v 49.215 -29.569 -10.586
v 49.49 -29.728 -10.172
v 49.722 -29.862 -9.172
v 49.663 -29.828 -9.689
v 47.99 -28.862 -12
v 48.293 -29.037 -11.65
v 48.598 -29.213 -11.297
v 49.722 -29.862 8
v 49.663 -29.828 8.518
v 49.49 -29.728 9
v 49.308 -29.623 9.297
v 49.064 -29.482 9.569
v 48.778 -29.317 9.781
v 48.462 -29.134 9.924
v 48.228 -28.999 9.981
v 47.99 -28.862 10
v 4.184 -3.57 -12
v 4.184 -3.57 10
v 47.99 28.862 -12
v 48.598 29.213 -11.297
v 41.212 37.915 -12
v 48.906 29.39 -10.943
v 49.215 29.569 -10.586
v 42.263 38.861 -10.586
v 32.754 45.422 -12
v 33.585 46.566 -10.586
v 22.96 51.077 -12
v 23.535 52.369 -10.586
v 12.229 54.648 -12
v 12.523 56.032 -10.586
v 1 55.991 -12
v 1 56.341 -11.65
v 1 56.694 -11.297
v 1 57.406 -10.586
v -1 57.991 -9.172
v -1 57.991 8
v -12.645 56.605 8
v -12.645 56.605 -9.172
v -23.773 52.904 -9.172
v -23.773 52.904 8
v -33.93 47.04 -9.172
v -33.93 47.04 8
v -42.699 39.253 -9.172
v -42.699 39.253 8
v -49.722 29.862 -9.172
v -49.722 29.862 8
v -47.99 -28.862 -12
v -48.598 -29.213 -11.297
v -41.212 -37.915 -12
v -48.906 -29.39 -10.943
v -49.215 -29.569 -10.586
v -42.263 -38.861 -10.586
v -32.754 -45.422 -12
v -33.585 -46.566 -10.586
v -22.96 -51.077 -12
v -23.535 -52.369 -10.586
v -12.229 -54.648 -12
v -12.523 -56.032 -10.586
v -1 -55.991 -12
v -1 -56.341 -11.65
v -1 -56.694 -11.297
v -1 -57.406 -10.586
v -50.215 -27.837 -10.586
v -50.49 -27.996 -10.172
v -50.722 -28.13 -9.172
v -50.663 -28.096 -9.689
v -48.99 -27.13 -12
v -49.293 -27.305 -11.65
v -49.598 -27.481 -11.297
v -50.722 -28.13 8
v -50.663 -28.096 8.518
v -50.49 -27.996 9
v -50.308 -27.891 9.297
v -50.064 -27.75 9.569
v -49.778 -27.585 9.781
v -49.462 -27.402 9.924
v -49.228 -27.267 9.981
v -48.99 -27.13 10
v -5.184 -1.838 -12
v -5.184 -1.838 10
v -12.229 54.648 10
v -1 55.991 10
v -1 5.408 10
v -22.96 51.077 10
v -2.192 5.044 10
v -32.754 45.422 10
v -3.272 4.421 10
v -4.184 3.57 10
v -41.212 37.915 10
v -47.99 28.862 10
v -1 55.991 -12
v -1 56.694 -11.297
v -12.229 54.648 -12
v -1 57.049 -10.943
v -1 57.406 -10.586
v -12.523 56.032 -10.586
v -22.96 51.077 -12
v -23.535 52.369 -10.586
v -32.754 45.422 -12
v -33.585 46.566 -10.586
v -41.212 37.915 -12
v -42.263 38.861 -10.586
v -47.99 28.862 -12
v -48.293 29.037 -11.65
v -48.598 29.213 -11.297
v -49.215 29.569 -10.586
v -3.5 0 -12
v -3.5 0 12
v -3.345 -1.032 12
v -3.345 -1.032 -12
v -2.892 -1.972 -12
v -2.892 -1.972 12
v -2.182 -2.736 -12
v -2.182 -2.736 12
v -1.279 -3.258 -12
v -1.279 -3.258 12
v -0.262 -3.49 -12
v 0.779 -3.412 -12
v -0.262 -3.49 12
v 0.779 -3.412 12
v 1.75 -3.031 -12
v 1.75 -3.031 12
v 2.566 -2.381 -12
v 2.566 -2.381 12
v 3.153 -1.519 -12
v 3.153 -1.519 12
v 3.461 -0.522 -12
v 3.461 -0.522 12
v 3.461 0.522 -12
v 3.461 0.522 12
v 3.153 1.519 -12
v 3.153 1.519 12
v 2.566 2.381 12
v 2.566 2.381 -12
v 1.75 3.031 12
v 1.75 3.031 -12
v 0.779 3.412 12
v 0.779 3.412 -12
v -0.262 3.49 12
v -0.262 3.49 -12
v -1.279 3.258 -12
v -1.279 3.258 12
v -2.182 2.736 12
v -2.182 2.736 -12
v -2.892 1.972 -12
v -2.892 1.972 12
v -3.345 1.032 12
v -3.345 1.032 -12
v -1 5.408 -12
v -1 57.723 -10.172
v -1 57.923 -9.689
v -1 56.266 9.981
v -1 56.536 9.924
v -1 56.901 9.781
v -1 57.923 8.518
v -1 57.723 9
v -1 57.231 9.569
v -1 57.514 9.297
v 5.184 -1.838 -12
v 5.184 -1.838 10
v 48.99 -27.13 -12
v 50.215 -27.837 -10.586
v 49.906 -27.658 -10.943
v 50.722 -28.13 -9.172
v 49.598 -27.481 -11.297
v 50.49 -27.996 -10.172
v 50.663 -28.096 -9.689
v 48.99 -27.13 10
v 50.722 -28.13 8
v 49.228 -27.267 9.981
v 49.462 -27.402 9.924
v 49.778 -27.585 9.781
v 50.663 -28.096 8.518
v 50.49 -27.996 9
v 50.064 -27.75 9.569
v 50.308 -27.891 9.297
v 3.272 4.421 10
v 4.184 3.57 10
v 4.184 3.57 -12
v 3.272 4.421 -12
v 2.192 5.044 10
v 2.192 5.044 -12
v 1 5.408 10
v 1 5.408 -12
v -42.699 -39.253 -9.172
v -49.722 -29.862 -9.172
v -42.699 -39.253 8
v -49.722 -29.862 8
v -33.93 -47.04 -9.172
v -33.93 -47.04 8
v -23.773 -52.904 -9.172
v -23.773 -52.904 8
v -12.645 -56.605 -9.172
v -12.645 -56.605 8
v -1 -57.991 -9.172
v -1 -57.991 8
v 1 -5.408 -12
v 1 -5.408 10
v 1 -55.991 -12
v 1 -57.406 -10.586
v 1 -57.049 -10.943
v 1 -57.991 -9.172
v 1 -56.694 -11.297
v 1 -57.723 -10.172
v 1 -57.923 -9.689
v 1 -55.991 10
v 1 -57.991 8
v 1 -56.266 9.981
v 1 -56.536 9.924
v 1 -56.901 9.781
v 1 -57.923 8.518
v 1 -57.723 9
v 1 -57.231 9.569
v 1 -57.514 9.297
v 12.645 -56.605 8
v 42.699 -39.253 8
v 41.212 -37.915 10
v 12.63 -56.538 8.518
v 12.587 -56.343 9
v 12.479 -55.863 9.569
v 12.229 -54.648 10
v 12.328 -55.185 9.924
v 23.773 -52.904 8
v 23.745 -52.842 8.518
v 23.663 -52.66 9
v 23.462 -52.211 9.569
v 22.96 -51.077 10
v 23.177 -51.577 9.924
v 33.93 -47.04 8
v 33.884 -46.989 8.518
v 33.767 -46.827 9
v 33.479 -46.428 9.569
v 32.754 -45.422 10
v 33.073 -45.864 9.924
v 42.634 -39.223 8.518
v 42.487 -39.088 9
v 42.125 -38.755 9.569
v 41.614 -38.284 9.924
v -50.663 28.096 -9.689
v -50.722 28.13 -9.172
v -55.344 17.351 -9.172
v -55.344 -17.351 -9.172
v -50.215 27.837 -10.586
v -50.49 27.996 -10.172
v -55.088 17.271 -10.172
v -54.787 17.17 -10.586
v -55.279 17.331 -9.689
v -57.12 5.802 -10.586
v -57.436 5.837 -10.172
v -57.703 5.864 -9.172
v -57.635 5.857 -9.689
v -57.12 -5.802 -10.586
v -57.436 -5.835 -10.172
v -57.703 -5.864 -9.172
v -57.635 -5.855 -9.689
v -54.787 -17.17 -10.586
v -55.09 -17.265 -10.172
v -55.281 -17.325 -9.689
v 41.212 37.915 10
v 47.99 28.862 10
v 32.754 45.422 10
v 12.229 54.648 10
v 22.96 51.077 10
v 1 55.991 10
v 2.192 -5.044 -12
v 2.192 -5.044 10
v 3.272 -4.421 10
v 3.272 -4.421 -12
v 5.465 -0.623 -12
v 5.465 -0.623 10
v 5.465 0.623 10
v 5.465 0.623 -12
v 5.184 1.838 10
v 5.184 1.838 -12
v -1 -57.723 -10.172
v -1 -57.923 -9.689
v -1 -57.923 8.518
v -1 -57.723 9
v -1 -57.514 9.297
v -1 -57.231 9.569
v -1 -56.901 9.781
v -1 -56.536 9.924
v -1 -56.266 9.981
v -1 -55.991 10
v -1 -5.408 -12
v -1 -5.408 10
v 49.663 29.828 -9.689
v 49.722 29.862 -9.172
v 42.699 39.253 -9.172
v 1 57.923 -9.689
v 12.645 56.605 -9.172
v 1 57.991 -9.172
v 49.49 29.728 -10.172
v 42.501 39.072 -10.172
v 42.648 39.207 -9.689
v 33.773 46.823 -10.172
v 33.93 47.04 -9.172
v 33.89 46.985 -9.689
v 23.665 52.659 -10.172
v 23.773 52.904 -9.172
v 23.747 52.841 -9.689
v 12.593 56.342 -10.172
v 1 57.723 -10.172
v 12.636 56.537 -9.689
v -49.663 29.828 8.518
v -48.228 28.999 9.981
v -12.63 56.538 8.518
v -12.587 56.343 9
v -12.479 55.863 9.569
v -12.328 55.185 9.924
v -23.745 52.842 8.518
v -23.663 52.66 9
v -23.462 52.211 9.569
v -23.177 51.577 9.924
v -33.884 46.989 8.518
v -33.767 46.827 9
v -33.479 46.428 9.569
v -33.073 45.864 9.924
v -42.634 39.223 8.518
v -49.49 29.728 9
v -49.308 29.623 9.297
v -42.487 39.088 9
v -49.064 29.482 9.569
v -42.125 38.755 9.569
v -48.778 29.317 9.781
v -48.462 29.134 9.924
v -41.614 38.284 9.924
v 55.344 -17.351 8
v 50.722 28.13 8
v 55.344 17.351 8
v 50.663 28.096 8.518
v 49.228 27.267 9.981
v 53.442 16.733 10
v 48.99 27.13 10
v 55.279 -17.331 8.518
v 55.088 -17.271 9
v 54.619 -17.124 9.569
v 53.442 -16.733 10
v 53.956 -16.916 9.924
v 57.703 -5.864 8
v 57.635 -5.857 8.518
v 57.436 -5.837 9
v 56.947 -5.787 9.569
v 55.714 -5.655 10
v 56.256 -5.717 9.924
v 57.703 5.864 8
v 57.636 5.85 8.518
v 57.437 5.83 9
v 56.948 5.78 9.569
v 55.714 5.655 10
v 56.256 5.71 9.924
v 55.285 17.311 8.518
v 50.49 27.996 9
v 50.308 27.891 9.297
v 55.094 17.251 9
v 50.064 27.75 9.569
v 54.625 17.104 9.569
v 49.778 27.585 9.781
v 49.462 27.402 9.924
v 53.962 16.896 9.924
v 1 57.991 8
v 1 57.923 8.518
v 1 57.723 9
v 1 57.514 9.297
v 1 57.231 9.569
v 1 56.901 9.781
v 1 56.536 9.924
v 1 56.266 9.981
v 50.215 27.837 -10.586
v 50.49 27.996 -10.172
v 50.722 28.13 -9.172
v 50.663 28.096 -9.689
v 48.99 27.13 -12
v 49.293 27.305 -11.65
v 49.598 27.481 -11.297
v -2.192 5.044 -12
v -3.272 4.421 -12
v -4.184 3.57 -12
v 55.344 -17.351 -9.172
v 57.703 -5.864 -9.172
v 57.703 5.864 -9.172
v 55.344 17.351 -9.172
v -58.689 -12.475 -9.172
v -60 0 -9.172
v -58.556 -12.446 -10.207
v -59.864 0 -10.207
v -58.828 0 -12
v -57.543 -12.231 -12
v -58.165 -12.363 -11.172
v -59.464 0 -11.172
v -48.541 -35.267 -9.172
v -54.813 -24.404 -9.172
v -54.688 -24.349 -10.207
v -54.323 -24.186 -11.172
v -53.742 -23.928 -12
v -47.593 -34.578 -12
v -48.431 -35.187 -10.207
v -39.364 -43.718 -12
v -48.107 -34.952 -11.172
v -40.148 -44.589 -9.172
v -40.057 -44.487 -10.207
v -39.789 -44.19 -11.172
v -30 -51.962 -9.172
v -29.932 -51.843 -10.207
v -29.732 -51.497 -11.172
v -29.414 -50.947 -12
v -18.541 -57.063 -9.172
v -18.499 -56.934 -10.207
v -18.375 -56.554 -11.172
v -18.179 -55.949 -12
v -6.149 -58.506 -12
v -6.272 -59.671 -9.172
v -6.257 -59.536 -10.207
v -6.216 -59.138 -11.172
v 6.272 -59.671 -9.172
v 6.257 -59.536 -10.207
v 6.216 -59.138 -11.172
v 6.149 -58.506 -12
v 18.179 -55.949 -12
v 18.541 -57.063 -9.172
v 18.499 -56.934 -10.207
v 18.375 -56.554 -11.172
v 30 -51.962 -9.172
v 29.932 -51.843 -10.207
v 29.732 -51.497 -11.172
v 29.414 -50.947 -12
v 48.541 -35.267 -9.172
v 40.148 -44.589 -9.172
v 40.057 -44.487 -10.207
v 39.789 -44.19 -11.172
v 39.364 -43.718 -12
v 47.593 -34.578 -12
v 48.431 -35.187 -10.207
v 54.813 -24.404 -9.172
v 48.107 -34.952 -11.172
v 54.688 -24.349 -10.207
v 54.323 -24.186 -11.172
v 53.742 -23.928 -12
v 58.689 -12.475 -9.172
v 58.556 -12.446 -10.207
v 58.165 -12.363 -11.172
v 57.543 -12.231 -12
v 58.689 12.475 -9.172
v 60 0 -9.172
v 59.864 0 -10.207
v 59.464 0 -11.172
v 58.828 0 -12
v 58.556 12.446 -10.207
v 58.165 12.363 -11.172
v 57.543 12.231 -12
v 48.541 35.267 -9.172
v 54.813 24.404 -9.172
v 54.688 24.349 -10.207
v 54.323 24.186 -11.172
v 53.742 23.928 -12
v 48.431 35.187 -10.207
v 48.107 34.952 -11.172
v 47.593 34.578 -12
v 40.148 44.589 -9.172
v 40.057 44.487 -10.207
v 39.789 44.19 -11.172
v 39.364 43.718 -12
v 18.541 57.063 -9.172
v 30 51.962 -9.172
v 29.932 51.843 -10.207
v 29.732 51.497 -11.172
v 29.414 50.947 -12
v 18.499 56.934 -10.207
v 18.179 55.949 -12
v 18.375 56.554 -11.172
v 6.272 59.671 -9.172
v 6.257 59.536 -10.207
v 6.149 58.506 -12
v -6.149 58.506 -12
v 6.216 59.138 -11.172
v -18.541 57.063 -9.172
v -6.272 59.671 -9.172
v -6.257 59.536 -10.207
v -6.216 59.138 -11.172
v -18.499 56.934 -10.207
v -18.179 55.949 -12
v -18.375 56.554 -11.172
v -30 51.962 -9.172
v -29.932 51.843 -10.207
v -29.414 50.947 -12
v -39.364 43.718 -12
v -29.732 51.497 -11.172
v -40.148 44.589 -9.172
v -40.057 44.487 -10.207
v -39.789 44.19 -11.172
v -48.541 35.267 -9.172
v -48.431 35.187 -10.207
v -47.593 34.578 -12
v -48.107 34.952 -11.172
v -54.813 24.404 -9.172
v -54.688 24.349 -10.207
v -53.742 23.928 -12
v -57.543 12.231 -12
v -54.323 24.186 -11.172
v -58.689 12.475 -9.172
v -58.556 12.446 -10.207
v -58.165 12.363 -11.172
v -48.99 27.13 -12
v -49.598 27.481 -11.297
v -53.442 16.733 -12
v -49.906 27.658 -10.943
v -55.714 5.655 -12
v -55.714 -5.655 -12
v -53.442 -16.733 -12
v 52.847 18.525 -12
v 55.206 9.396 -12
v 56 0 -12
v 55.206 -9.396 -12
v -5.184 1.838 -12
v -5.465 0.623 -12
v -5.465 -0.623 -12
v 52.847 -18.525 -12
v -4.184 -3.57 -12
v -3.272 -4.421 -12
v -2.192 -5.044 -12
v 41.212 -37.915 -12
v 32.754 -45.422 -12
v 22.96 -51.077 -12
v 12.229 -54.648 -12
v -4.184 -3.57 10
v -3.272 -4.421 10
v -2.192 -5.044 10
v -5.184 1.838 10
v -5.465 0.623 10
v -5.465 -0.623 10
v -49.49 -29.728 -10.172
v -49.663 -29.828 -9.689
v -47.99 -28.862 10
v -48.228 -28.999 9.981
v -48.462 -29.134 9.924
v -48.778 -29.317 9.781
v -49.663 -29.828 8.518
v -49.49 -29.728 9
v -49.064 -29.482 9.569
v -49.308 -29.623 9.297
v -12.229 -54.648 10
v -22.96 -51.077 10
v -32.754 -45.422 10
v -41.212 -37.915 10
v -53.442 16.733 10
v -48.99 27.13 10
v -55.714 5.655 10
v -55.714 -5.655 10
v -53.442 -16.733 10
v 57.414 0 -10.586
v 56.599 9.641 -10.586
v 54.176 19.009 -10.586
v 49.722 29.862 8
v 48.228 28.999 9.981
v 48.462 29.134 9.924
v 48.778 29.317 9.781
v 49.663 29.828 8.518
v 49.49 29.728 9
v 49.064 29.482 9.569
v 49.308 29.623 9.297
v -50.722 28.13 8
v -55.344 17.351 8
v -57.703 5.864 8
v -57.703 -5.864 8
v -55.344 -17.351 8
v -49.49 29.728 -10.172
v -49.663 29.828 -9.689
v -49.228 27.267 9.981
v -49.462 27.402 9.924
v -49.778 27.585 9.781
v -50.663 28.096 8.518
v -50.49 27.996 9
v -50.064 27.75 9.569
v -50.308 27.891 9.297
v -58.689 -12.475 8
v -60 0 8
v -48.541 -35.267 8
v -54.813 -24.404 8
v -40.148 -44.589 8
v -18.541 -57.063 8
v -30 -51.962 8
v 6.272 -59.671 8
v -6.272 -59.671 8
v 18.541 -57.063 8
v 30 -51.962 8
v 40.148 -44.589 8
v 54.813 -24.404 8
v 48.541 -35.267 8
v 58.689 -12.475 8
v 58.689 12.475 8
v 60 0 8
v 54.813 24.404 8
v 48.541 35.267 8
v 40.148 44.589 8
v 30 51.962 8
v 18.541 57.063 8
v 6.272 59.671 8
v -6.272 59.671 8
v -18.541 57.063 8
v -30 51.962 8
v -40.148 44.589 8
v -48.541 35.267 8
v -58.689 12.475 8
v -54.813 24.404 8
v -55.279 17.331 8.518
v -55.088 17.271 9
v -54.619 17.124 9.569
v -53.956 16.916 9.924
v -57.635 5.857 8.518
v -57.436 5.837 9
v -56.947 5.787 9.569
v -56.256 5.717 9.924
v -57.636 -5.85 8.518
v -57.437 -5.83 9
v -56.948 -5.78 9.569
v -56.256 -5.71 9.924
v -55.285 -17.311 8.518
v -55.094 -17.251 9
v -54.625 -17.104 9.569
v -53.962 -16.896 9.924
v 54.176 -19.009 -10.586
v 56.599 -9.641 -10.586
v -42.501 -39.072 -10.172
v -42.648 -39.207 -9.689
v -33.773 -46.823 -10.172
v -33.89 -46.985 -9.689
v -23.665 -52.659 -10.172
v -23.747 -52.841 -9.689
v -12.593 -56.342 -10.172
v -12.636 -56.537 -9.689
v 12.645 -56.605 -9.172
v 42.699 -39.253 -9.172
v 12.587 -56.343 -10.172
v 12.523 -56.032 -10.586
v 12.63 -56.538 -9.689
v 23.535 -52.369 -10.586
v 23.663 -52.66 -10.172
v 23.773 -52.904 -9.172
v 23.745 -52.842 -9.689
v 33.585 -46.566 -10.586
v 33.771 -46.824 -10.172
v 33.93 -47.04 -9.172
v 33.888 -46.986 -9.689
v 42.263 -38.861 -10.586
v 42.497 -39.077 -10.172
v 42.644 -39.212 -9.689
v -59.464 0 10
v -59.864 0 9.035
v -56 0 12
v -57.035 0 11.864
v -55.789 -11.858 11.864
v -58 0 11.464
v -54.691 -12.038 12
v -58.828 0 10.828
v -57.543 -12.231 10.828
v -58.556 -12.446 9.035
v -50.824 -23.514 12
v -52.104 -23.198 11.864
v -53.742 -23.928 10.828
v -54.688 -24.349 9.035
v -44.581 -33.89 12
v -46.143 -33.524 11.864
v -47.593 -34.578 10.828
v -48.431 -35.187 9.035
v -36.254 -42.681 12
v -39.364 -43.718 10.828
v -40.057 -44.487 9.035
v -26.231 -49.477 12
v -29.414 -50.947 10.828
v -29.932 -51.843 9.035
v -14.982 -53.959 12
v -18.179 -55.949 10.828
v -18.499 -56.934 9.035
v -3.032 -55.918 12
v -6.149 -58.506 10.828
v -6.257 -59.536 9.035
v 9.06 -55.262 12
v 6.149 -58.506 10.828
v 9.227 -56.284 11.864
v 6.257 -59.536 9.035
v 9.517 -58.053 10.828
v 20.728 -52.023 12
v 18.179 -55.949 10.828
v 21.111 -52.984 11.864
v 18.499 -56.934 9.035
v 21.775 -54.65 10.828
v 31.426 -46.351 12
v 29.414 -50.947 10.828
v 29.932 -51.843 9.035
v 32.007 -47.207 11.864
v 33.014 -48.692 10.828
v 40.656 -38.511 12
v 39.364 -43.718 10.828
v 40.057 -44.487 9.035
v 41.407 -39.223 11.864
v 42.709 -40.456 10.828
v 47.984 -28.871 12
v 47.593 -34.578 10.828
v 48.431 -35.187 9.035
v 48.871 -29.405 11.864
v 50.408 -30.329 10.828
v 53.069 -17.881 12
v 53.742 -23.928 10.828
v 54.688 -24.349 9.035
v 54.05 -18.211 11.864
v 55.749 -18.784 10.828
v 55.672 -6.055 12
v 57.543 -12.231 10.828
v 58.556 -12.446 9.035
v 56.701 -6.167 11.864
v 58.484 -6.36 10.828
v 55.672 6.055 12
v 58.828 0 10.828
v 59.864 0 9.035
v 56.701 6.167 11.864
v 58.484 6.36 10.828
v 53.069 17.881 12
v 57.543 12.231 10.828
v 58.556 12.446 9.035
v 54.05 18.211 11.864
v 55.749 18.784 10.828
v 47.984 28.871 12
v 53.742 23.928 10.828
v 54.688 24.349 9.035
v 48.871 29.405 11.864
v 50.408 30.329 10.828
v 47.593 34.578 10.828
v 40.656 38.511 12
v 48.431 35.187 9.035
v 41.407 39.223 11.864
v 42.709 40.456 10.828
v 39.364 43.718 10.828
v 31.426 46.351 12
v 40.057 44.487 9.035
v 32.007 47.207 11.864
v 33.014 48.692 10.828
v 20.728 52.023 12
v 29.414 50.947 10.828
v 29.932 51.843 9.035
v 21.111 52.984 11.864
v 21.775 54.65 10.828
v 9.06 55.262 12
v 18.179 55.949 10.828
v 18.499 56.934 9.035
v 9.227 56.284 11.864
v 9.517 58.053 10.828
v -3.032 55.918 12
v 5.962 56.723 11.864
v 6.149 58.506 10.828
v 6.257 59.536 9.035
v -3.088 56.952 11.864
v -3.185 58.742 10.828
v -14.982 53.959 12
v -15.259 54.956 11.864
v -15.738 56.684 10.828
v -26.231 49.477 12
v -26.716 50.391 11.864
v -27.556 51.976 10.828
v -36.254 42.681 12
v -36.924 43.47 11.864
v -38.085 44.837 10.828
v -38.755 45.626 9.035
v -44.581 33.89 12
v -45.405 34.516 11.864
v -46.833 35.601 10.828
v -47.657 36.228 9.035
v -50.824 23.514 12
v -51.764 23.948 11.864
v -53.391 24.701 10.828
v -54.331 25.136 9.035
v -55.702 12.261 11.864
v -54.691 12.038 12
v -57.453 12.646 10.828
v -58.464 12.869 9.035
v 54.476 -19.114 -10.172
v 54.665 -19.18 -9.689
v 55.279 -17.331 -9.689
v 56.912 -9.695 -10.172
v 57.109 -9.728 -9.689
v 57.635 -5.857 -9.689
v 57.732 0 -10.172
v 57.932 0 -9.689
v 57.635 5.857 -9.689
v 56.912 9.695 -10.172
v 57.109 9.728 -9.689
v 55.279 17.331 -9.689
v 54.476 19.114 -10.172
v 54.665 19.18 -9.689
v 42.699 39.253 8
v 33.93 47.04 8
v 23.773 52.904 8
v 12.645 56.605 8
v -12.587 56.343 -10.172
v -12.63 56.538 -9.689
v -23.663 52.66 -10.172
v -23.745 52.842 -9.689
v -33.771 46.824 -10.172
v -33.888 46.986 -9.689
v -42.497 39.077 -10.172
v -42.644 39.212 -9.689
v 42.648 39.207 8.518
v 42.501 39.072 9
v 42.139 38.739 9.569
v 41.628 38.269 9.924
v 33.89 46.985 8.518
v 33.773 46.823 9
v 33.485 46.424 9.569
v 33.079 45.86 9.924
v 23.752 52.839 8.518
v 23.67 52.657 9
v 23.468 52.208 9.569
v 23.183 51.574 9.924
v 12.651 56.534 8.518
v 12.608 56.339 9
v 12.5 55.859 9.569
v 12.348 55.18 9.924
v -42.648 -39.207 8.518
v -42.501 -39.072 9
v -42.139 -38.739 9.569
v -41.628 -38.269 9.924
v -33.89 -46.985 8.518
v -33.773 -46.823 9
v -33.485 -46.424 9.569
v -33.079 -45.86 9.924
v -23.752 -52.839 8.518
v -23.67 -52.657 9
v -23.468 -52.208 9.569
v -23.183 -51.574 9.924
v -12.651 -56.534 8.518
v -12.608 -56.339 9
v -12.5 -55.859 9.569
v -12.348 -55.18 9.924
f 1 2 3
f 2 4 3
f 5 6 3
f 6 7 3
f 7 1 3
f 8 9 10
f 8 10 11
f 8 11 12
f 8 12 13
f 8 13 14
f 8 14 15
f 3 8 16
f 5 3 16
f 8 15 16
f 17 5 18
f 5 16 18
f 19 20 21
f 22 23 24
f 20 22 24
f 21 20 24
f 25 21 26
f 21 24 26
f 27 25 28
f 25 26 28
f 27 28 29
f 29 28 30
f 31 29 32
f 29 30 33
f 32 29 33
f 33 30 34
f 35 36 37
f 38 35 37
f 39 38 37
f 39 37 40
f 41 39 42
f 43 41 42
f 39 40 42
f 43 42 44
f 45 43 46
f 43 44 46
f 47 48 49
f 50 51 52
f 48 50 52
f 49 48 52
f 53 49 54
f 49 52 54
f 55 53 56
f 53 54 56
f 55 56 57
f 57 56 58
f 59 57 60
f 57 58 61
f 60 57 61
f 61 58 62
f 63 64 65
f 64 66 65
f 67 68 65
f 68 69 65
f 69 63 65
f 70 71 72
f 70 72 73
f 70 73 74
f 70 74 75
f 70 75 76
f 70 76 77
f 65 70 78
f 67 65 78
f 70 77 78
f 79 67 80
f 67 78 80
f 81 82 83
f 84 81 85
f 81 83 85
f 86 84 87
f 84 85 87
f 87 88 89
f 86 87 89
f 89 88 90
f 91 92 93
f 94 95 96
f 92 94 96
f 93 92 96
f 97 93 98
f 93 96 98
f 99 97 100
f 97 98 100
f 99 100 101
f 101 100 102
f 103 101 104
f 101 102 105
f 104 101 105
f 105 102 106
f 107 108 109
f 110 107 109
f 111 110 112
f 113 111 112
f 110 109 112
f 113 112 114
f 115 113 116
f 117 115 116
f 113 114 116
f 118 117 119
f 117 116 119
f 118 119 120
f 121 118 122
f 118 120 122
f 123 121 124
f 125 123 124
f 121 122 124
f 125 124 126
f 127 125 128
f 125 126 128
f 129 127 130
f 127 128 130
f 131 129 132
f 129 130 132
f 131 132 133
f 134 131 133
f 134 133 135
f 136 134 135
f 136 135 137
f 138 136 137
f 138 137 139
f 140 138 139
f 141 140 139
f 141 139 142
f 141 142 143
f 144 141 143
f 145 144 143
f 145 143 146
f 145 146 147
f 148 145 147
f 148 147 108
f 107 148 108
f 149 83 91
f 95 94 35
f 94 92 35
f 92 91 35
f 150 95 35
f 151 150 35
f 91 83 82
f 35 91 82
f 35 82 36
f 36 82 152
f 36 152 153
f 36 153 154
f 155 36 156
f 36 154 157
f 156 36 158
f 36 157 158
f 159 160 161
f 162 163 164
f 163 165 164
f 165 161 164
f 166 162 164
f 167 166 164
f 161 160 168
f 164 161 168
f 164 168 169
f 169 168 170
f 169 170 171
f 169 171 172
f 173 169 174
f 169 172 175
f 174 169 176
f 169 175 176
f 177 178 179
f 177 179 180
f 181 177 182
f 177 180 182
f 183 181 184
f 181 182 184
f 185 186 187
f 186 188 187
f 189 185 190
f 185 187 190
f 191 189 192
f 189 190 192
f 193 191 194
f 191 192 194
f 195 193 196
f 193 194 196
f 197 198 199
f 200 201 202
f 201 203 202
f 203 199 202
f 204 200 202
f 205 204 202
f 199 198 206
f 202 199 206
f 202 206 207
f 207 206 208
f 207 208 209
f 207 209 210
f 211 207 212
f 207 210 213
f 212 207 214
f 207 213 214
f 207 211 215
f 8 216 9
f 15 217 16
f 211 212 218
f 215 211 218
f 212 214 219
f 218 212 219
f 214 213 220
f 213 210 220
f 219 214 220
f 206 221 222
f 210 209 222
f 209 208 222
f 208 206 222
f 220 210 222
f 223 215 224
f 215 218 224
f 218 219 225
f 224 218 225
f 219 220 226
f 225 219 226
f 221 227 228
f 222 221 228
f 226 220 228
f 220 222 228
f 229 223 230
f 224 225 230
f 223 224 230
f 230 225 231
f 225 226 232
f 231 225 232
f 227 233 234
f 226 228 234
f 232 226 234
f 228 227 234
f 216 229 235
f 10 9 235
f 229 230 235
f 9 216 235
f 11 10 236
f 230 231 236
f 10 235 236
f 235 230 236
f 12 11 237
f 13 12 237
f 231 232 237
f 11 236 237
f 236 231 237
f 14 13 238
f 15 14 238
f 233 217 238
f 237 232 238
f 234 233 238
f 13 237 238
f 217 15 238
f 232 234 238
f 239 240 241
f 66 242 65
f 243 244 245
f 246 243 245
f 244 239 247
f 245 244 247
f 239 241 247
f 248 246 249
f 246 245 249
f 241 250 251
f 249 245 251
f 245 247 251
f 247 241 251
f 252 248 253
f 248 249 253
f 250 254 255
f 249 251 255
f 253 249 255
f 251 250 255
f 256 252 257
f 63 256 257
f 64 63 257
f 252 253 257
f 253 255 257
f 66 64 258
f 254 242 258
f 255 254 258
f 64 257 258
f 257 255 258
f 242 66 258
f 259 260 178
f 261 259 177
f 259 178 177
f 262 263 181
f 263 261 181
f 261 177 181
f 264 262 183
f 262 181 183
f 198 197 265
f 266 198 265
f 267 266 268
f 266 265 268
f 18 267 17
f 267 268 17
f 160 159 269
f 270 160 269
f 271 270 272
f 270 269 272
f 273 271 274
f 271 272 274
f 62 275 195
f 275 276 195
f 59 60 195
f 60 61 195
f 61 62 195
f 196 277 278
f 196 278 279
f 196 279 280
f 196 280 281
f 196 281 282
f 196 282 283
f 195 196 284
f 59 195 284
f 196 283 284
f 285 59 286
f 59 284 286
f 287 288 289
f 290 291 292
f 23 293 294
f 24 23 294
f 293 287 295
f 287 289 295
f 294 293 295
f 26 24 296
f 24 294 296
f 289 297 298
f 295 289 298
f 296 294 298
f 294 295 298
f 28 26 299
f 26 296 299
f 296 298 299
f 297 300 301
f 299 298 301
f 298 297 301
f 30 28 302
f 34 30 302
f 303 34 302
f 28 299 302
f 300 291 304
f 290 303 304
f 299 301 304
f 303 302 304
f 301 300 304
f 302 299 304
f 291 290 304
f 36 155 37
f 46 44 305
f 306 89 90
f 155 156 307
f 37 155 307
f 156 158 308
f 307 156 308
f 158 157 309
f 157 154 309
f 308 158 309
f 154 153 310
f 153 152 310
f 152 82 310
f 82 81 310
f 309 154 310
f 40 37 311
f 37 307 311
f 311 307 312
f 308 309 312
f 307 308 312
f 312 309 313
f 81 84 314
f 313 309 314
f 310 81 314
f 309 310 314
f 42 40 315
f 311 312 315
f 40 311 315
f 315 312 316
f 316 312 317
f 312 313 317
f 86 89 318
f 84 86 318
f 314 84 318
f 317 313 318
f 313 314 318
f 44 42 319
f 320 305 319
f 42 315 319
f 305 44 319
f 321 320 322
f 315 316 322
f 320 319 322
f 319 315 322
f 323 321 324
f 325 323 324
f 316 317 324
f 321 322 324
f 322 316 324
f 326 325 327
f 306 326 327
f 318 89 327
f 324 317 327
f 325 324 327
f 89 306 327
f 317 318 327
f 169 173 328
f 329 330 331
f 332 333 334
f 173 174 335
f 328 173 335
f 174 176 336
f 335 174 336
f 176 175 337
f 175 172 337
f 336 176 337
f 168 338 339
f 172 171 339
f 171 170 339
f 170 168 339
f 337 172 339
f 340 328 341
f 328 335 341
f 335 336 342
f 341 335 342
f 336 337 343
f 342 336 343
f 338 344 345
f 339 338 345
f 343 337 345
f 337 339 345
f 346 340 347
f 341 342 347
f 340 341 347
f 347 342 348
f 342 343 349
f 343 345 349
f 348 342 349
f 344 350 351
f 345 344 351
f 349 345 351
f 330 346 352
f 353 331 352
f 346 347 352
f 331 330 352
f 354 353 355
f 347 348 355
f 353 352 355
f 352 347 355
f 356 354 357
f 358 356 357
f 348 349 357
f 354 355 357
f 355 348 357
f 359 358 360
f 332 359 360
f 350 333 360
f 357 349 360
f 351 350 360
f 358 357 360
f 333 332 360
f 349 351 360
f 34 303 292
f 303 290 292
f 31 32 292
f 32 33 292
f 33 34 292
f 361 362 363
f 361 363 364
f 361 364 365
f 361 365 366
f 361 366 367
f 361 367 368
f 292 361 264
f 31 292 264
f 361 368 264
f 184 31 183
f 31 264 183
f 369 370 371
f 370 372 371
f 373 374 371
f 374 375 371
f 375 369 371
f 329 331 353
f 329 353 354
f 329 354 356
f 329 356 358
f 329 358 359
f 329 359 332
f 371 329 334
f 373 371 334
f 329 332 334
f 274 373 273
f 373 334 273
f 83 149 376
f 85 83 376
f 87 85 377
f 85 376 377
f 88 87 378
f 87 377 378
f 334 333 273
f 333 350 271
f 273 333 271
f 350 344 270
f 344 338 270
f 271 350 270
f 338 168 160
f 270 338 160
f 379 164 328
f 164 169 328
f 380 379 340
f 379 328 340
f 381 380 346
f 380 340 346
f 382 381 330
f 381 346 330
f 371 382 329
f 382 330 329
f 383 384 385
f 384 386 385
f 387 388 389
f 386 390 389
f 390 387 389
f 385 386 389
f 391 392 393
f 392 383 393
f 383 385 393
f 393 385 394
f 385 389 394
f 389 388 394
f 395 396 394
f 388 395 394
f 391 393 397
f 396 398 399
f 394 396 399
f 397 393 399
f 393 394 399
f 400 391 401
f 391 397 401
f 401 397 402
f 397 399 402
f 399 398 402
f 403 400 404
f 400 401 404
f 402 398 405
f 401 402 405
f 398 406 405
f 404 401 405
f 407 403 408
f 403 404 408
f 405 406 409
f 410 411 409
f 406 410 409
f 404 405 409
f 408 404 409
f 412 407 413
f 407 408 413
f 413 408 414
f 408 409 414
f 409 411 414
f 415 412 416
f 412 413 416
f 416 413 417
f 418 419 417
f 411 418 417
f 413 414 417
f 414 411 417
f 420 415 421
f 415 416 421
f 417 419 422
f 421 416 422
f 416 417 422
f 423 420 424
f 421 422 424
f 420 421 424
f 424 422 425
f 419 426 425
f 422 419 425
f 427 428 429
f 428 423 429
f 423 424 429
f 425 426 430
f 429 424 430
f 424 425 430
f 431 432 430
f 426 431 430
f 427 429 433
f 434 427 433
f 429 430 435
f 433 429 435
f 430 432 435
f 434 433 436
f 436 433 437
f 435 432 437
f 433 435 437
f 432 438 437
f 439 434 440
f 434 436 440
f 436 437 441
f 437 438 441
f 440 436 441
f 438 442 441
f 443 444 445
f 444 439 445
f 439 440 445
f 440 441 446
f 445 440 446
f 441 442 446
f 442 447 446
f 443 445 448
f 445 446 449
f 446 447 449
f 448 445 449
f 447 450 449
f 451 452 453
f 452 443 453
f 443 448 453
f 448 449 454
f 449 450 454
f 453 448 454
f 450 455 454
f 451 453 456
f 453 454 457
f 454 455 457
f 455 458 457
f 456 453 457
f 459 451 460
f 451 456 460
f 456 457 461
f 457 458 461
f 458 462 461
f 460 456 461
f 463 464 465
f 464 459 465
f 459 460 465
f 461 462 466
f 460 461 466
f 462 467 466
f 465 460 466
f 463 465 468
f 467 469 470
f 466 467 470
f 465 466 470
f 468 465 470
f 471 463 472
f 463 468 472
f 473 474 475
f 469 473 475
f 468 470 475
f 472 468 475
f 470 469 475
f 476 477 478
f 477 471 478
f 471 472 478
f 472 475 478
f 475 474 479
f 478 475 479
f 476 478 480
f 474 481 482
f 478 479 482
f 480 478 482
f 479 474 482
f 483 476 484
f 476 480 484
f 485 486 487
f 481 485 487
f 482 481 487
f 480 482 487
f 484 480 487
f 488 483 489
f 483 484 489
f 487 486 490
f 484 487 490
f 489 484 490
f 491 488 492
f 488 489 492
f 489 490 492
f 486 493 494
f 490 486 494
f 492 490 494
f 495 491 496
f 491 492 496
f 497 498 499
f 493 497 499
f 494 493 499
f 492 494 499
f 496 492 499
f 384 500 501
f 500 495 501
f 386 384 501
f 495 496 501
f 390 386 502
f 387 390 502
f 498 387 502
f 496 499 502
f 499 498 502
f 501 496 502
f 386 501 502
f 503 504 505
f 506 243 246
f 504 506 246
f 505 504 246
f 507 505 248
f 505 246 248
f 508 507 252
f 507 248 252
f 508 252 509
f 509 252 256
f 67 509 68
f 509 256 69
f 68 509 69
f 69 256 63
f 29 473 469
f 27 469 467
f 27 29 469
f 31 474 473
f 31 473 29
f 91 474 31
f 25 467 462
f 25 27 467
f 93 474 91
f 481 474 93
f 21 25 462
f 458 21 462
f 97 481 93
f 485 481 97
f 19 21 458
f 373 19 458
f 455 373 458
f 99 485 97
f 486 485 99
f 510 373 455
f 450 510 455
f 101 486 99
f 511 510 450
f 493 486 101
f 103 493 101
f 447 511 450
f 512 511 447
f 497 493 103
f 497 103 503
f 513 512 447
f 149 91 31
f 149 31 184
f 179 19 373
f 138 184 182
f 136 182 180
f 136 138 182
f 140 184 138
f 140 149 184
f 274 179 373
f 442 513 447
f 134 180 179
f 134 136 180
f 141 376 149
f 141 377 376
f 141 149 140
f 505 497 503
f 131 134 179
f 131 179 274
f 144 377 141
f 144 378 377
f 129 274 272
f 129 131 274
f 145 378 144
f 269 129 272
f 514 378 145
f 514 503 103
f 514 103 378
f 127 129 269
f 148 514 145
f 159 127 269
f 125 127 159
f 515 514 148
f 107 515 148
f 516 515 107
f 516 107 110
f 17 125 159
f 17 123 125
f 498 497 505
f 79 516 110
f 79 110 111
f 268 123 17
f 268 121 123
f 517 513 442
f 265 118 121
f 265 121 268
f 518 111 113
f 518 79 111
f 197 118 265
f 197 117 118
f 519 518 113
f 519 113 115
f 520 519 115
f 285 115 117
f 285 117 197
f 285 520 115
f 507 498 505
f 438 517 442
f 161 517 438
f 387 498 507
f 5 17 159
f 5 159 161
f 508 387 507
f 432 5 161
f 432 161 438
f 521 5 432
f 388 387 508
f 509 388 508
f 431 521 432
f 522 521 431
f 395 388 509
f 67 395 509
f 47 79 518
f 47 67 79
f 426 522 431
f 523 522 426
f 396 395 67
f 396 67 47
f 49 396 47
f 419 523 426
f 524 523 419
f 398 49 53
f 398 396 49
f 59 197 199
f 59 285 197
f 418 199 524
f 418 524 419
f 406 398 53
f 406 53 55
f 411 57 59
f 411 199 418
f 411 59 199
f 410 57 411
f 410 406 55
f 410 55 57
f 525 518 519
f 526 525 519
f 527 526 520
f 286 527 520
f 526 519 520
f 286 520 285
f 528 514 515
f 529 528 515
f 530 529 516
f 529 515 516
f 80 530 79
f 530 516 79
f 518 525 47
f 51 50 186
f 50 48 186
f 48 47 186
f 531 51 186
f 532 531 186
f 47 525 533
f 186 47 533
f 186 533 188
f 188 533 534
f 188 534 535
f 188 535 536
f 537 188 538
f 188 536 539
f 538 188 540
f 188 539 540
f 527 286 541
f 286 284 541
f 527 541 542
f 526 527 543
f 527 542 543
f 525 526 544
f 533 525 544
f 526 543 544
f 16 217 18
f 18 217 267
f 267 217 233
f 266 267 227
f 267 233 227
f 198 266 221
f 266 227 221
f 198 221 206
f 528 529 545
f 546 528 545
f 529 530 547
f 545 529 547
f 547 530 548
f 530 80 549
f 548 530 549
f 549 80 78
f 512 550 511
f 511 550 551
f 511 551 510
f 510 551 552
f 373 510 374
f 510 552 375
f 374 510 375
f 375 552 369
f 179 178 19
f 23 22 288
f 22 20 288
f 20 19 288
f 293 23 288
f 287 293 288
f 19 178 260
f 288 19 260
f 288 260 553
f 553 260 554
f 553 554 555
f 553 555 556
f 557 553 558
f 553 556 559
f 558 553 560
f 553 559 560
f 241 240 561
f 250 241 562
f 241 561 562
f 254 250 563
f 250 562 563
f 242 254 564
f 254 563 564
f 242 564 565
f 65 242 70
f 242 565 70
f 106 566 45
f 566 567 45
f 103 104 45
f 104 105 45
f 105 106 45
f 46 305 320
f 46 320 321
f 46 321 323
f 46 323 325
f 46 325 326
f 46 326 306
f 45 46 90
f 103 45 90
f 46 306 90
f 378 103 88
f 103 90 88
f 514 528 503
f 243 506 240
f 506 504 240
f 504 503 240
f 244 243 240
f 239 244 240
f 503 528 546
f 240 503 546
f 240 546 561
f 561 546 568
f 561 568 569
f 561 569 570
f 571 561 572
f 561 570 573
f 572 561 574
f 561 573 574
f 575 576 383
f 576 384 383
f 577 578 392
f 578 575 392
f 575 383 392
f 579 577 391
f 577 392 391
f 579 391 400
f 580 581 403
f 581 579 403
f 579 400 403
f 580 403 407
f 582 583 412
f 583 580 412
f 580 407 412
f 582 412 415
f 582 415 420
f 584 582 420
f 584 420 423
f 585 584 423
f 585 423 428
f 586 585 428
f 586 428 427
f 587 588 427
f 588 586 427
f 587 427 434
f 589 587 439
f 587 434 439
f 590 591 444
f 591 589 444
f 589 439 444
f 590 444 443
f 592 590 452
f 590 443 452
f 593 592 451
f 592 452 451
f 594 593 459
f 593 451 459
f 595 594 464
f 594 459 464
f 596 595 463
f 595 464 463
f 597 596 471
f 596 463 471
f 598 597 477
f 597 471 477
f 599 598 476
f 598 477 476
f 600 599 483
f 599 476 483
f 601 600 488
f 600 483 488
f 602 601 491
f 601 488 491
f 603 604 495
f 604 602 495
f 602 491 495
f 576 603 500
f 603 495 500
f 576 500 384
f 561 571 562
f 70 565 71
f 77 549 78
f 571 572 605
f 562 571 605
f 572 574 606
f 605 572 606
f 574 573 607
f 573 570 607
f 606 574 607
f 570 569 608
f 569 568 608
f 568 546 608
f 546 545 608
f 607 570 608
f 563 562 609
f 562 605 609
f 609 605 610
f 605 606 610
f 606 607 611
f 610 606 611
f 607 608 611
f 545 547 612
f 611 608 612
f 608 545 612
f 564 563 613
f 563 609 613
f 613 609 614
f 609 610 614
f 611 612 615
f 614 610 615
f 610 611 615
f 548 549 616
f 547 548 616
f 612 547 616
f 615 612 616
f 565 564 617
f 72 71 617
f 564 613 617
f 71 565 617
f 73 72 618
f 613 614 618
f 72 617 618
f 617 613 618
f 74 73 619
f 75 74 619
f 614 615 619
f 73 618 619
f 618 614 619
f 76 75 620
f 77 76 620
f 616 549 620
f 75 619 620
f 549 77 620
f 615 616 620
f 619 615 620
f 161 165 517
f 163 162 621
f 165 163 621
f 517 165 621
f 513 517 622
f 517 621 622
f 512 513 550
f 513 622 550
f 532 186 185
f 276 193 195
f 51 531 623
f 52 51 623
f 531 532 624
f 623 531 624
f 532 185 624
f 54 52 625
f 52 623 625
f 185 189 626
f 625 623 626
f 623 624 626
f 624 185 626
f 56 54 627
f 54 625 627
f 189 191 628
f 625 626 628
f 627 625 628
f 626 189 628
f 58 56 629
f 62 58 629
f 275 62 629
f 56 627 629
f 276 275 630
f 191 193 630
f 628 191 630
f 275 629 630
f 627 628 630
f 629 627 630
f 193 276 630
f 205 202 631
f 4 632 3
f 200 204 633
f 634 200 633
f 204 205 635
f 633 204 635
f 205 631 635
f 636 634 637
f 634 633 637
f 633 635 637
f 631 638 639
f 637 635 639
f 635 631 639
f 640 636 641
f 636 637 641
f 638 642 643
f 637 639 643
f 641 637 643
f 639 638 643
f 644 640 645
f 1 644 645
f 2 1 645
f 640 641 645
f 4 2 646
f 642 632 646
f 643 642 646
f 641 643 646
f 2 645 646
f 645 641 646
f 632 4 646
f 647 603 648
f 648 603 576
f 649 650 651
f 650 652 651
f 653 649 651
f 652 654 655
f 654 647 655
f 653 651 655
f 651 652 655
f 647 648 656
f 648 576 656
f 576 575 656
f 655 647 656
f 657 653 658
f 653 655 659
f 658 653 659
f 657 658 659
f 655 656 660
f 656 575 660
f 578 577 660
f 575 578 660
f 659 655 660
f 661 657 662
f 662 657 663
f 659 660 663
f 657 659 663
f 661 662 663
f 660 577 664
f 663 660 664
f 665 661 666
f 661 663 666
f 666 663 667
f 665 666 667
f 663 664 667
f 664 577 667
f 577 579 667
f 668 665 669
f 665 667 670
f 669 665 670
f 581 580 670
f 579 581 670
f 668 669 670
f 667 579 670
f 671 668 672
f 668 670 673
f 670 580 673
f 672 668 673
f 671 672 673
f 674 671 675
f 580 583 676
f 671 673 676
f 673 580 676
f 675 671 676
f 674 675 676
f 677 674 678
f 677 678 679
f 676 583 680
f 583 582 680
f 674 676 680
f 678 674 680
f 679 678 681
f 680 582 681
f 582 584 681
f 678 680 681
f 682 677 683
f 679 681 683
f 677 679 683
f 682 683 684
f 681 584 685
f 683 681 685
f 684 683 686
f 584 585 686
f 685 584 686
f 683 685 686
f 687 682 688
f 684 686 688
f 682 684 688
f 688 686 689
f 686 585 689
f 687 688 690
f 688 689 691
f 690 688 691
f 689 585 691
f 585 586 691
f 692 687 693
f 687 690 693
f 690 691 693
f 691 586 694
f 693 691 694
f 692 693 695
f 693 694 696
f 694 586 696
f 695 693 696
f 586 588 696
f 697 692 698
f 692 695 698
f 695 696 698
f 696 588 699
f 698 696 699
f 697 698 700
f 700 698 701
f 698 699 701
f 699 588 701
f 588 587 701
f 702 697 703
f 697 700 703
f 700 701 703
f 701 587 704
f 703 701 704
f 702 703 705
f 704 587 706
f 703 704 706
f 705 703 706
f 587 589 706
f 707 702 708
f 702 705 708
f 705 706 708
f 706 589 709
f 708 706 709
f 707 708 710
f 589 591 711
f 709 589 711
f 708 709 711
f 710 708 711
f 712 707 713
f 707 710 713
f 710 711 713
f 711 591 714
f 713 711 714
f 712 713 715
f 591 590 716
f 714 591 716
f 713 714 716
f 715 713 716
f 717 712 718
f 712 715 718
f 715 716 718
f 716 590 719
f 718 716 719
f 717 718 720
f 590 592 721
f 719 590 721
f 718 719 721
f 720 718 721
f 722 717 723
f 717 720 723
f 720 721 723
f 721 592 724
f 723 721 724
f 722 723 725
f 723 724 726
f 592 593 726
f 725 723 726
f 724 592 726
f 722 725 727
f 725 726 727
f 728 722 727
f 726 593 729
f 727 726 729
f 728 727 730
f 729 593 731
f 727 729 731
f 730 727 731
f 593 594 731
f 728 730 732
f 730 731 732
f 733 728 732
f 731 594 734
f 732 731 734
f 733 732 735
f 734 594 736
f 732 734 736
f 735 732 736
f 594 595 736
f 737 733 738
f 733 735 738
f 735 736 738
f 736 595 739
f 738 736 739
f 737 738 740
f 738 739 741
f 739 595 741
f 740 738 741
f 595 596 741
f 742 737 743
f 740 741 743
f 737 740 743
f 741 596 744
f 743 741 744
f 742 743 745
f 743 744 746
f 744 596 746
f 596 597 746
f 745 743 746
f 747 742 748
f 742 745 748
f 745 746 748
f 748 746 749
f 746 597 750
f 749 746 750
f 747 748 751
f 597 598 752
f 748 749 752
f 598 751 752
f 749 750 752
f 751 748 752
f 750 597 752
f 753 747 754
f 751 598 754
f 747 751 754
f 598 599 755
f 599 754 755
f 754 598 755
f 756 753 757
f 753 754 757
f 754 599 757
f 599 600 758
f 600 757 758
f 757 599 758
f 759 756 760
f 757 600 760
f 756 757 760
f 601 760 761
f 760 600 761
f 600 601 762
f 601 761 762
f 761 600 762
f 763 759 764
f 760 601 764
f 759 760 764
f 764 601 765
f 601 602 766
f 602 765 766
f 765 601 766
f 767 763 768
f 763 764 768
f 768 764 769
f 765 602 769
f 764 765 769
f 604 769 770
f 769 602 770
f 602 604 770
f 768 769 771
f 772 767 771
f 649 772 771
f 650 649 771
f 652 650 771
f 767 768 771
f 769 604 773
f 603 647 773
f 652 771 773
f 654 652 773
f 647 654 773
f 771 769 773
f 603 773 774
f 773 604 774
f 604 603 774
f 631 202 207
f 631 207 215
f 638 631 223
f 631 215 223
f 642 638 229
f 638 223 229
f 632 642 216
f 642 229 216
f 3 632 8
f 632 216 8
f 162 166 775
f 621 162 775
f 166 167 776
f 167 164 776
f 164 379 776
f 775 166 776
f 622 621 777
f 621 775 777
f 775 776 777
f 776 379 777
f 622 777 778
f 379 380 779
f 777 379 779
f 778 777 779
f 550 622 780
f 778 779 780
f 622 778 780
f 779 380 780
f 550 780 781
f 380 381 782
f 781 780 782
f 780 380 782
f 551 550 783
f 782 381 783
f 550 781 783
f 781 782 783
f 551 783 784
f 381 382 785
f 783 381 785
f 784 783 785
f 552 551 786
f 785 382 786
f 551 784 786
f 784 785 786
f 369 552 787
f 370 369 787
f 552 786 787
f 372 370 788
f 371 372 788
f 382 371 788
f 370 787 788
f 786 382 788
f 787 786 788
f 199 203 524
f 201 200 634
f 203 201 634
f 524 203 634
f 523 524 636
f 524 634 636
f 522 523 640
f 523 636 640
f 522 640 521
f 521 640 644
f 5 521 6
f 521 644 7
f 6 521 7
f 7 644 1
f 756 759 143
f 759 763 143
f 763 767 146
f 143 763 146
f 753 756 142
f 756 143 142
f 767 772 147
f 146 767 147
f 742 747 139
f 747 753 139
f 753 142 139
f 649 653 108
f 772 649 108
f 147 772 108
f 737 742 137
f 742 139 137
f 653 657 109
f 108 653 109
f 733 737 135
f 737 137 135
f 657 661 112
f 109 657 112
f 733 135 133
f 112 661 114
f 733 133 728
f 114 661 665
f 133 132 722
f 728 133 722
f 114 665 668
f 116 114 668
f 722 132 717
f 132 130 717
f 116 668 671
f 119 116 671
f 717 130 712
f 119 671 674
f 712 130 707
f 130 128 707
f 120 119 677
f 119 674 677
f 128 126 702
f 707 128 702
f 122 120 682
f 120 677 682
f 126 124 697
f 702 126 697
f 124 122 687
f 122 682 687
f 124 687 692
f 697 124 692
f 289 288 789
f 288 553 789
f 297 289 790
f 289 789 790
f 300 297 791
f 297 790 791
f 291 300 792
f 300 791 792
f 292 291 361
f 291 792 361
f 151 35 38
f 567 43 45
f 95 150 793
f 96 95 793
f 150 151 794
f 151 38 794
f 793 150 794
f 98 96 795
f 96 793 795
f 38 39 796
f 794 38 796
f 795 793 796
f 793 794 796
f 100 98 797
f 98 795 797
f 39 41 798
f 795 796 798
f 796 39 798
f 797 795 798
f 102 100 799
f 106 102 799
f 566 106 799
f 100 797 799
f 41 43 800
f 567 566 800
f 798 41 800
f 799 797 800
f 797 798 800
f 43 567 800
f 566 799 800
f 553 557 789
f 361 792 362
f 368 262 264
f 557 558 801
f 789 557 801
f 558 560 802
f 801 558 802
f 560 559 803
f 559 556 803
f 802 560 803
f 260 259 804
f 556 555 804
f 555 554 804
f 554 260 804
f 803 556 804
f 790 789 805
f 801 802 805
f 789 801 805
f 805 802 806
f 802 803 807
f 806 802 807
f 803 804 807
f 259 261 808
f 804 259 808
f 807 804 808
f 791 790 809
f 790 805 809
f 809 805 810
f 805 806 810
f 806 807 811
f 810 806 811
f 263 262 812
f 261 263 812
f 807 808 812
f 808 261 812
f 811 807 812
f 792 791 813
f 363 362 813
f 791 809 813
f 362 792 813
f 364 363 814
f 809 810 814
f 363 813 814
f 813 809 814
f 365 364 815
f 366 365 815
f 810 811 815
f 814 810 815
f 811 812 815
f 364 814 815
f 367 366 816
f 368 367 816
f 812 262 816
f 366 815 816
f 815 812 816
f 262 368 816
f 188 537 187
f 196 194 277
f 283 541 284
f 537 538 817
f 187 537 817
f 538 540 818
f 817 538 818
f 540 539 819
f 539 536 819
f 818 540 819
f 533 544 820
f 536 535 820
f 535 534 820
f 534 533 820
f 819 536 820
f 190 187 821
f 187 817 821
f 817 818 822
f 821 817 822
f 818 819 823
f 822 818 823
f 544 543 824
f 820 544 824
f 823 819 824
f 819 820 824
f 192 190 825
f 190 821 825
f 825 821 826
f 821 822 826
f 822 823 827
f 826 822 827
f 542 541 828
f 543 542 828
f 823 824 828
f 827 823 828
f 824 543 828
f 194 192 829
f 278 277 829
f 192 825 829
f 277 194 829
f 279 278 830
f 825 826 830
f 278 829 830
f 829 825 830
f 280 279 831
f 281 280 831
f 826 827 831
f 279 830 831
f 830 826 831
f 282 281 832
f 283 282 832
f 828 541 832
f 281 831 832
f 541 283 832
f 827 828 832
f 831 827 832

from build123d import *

# Parameters (mm, degrees)
F3_DEPTH = 22
F4_COUNT = 6


with BuildPart() as f1:
    # F0 (on Front) → F1 (revolve)
    with BuildSketch(Plane.XZ):
        with BuildLine():
            Line((-3.5, 12), (-56, 12))
            ThreePointArc((-56, 12), (-58.8284271247, 10.8284271247), (-60, 8))
            Line((-60, 8), (-60, -9.1715728753))
            ThreePointArc((-60, -9.1715728753), (-59.69551813, -10.7023066047), (-58.8284271247, -12))
            Line((-58.8284271247, -12), (-56, -12))
            Line((-56, -12), (-57.4142135624, -10.5857864376))
            ThreePointArc((-57.4142135624, -10.5857864376), (-57.847759065, -9.93693974), (-58, -9.1715728753))
            Line((-58, -9.1715728753), (-58, 8))
            ThreePointArc((-58, 8), (-57.4142135624, 9.4142135624), (-56, 10))
            Line((-56, 10), (-5.5, 10))
            Line((-5.5, 10), (-5.5, -12))
            Line((-5.5, -12), (-3.5, -12))
            Line((-3.5, -12), (-3.5, 12))
        make_face()
    revolve(axis=Axis((0, 0, 0), (0, 0, 1)))

    # F2 (on face) → F3 (join, through all)
    with BuildSketch(Plane(origin=(0, 0, 10), x_dir=(1, 0, 0), z_dir=(0, 0, -1))):
        with BuildLine():
            ThreePointArc((1, -55.9910707167), (0, -56), (-1, -55.9910707167))
            Line((-1, -55.9910707167), (-1, -57.9913786696))
            ThreePointArc((-1, -57.9913786696), (0, -58), (1, -57.9913786696))
            Line((1, -57.9913786696), (1, -55.9910707167))
        make_face()
        with BuildLine():
            ThreePointArc((1, -5.4083269132), (0, -5.5), (-1, -5.4083269132))
            Line((-1, -5.4083269132), (-1, -55.9910707167))
            ThreePointArc((-1, -55.9910707167), (0, -56), (1, -55.9910707167))
            Line((1, -55.9910707167), (1, -5.4083269132))
        make_face()
    extrude(amount=F3_DEPTH)

    # F4: F1 ×6 about axis
    f4_axis = Axis((0, 0, 0), (0, 0, 1))


with BuildPart() as f1_1:
    add(f1.part)
    for i in range(1, F4_COUNT):
        add(f1.part.rotate(f4_axis, i * 360 / F4_COUNT))


solid = f1_1.part
